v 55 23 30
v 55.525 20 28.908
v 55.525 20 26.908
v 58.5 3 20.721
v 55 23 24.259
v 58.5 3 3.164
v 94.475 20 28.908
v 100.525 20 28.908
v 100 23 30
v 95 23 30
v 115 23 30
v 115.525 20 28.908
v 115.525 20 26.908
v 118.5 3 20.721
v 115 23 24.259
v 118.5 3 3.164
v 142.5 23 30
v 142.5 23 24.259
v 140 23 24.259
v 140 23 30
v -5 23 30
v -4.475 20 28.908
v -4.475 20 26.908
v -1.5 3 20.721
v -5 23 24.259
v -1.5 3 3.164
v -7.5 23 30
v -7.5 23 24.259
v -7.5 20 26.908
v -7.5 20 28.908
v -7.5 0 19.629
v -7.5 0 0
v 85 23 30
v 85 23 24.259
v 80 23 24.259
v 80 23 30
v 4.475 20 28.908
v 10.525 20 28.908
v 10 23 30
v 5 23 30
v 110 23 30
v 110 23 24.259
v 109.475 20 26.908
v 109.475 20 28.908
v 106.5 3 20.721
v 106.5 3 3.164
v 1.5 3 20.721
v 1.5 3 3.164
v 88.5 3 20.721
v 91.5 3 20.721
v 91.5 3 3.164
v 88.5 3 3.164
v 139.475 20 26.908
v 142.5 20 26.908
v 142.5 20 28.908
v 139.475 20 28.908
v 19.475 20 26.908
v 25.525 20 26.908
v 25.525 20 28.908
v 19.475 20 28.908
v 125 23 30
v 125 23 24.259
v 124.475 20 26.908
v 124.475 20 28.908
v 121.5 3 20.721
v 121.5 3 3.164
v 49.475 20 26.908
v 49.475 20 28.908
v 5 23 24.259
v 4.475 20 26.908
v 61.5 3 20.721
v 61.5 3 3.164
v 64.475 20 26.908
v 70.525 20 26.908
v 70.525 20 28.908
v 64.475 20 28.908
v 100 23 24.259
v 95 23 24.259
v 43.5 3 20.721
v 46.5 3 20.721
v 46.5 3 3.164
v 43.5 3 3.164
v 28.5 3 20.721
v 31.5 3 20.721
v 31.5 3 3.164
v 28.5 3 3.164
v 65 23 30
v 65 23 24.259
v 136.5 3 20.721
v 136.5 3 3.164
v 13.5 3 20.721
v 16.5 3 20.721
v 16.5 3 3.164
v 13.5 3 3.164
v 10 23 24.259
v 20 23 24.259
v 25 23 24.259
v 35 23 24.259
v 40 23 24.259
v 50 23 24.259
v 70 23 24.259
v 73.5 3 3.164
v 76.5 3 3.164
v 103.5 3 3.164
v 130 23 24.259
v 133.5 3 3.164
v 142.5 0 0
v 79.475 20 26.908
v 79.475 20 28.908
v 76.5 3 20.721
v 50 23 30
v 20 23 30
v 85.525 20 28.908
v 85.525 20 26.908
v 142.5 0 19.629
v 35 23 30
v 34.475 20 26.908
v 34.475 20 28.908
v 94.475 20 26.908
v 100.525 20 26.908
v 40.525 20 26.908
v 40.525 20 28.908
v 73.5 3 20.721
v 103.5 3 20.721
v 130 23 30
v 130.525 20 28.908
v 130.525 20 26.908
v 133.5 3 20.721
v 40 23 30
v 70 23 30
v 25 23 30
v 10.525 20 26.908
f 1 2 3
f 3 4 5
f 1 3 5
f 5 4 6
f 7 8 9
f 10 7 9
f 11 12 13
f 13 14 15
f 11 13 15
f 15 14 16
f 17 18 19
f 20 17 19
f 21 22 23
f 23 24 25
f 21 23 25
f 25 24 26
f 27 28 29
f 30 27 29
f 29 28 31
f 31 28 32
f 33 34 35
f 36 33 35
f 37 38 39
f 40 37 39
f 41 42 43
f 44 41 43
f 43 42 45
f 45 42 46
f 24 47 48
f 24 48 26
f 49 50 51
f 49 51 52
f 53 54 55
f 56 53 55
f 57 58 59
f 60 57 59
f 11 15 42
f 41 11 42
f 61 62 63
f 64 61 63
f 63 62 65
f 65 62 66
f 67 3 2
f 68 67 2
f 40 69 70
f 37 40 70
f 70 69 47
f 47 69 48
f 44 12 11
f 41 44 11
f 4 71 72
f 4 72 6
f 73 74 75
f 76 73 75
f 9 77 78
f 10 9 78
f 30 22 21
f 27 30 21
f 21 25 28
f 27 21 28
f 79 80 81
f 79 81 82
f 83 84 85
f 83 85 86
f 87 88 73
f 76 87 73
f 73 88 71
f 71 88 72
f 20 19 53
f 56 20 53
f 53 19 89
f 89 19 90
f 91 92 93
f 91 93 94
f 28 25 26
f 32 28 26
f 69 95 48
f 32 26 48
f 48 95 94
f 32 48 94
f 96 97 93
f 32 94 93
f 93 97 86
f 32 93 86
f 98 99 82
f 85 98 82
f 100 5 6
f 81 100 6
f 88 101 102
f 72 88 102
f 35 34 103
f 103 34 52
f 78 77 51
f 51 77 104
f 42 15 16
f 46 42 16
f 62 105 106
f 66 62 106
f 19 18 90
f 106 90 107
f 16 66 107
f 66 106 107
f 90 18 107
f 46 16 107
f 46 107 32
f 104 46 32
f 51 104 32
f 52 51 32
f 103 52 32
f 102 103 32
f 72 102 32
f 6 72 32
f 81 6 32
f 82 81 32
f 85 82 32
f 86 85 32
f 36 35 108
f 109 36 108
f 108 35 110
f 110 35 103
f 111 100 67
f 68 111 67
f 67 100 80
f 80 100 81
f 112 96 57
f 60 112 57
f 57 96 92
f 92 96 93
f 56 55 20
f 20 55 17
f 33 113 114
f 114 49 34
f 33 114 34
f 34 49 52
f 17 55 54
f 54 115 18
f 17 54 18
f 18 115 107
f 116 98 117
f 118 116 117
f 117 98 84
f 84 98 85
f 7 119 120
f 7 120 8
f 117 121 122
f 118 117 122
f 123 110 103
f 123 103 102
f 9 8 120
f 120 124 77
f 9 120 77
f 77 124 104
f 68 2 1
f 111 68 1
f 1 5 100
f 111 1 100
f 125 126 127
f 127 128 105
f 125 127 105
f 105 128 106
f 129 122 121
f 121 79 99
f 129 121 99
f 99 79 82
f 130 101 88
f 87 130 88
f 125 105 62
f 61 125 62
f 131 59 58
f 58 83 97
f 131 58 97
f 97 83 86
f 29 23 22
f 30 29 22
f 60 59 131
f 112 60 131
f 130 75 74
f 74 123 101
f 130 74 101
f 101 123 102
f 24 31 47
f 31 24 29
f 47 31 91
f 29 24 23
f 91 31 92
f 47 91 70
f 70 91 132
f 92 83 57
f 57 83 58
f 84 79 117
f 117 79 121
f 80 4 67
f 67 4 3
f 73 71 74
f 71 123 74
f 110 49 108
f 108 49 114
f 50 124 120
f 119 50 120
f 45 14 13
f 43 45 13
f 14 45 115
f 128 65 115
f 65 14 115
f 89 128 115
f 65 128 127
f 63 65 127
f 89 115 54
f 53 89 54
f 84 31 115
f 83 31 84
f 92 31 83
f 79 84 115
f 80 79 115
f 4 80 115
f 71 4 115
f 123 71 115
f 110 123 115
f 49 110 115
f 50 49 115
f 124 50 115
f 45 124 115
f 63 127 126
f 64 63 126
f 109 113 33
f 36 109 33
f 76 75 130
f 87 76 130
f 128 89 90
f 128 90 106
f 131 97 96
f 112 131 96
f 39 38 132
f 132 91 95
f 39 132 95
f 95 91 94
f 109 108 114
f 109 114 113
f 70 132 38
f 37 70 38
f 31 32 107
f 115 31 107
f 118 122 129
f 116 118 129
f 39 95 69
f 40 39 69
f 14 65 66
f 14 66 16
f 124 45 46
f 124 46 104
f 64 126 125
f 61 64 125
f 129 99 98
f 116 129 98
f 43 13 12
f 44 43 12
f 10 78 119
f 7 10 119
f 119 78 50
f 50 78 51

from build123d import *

# Parameters (mm, degrees)
F1_DEPTH = 30
F3_DEPTH = 150.001


with BuildPart() as f1:
    # F0 (on Top) → F1 (new body)
    with BuildSketch(Plane.XY):
        Polygon((-5, 23), (-7.5, 23), (-7.5, 0), (142.5, 0), (142.5, 23), (140, 23), (136.5, 3), (135, 3), (133.5, 3), (130, 23), (127.5, 23), (125, 23), (121.5, 3), (120, 3), (118.5, 3), (115, 23), (112.5, 23), (110, 23), (106.5, 3), (105, 3), (103.5, 3), (100, 23), (97.5, 23), (95, 23), (91.5, 3), (90, 3), (88.5, 3), (85, 23), (82.5, 23), (80, 23), (76.5, 3), (75, 3), (73.5, 3), (70, 23), (67.5, 23), (65, 23), (61.5, 3), (60, 3), (58.5, 3), (55, 23), (52.5, 23), (50, 23), (46.5, 3), (45, 3), (43.5, 3), (40, 23), (37.5, 23), (35, 23), (31.5, 3), (30, 3), (28.5, 3), (25, 23), (22.5, 23), (20, 23), (16.5, 3), (15, 3), (13.5, 3), (10, 23), (7.5, 23), (5, 23), (1.5, 3), (0, 3), (-1.5, 3), align=None)
    extrude(amount=F1_DEPTH)

    # F2 (on face) → F3 (cut, through all)
    with BuildSketch(Plane.YZ.offset(142.5)):
        Polygon((20, 28.908089), (23, 30), (0, 30), (0, 19.628685), (20, 26.908089), align=None)
        Polygon((23, 24.258563), (0, 0), (23, 0), align=None)
    extrude(amount=-F3_DEPTH, mode=Mode.SUBTRACT)


solid = f1.part
